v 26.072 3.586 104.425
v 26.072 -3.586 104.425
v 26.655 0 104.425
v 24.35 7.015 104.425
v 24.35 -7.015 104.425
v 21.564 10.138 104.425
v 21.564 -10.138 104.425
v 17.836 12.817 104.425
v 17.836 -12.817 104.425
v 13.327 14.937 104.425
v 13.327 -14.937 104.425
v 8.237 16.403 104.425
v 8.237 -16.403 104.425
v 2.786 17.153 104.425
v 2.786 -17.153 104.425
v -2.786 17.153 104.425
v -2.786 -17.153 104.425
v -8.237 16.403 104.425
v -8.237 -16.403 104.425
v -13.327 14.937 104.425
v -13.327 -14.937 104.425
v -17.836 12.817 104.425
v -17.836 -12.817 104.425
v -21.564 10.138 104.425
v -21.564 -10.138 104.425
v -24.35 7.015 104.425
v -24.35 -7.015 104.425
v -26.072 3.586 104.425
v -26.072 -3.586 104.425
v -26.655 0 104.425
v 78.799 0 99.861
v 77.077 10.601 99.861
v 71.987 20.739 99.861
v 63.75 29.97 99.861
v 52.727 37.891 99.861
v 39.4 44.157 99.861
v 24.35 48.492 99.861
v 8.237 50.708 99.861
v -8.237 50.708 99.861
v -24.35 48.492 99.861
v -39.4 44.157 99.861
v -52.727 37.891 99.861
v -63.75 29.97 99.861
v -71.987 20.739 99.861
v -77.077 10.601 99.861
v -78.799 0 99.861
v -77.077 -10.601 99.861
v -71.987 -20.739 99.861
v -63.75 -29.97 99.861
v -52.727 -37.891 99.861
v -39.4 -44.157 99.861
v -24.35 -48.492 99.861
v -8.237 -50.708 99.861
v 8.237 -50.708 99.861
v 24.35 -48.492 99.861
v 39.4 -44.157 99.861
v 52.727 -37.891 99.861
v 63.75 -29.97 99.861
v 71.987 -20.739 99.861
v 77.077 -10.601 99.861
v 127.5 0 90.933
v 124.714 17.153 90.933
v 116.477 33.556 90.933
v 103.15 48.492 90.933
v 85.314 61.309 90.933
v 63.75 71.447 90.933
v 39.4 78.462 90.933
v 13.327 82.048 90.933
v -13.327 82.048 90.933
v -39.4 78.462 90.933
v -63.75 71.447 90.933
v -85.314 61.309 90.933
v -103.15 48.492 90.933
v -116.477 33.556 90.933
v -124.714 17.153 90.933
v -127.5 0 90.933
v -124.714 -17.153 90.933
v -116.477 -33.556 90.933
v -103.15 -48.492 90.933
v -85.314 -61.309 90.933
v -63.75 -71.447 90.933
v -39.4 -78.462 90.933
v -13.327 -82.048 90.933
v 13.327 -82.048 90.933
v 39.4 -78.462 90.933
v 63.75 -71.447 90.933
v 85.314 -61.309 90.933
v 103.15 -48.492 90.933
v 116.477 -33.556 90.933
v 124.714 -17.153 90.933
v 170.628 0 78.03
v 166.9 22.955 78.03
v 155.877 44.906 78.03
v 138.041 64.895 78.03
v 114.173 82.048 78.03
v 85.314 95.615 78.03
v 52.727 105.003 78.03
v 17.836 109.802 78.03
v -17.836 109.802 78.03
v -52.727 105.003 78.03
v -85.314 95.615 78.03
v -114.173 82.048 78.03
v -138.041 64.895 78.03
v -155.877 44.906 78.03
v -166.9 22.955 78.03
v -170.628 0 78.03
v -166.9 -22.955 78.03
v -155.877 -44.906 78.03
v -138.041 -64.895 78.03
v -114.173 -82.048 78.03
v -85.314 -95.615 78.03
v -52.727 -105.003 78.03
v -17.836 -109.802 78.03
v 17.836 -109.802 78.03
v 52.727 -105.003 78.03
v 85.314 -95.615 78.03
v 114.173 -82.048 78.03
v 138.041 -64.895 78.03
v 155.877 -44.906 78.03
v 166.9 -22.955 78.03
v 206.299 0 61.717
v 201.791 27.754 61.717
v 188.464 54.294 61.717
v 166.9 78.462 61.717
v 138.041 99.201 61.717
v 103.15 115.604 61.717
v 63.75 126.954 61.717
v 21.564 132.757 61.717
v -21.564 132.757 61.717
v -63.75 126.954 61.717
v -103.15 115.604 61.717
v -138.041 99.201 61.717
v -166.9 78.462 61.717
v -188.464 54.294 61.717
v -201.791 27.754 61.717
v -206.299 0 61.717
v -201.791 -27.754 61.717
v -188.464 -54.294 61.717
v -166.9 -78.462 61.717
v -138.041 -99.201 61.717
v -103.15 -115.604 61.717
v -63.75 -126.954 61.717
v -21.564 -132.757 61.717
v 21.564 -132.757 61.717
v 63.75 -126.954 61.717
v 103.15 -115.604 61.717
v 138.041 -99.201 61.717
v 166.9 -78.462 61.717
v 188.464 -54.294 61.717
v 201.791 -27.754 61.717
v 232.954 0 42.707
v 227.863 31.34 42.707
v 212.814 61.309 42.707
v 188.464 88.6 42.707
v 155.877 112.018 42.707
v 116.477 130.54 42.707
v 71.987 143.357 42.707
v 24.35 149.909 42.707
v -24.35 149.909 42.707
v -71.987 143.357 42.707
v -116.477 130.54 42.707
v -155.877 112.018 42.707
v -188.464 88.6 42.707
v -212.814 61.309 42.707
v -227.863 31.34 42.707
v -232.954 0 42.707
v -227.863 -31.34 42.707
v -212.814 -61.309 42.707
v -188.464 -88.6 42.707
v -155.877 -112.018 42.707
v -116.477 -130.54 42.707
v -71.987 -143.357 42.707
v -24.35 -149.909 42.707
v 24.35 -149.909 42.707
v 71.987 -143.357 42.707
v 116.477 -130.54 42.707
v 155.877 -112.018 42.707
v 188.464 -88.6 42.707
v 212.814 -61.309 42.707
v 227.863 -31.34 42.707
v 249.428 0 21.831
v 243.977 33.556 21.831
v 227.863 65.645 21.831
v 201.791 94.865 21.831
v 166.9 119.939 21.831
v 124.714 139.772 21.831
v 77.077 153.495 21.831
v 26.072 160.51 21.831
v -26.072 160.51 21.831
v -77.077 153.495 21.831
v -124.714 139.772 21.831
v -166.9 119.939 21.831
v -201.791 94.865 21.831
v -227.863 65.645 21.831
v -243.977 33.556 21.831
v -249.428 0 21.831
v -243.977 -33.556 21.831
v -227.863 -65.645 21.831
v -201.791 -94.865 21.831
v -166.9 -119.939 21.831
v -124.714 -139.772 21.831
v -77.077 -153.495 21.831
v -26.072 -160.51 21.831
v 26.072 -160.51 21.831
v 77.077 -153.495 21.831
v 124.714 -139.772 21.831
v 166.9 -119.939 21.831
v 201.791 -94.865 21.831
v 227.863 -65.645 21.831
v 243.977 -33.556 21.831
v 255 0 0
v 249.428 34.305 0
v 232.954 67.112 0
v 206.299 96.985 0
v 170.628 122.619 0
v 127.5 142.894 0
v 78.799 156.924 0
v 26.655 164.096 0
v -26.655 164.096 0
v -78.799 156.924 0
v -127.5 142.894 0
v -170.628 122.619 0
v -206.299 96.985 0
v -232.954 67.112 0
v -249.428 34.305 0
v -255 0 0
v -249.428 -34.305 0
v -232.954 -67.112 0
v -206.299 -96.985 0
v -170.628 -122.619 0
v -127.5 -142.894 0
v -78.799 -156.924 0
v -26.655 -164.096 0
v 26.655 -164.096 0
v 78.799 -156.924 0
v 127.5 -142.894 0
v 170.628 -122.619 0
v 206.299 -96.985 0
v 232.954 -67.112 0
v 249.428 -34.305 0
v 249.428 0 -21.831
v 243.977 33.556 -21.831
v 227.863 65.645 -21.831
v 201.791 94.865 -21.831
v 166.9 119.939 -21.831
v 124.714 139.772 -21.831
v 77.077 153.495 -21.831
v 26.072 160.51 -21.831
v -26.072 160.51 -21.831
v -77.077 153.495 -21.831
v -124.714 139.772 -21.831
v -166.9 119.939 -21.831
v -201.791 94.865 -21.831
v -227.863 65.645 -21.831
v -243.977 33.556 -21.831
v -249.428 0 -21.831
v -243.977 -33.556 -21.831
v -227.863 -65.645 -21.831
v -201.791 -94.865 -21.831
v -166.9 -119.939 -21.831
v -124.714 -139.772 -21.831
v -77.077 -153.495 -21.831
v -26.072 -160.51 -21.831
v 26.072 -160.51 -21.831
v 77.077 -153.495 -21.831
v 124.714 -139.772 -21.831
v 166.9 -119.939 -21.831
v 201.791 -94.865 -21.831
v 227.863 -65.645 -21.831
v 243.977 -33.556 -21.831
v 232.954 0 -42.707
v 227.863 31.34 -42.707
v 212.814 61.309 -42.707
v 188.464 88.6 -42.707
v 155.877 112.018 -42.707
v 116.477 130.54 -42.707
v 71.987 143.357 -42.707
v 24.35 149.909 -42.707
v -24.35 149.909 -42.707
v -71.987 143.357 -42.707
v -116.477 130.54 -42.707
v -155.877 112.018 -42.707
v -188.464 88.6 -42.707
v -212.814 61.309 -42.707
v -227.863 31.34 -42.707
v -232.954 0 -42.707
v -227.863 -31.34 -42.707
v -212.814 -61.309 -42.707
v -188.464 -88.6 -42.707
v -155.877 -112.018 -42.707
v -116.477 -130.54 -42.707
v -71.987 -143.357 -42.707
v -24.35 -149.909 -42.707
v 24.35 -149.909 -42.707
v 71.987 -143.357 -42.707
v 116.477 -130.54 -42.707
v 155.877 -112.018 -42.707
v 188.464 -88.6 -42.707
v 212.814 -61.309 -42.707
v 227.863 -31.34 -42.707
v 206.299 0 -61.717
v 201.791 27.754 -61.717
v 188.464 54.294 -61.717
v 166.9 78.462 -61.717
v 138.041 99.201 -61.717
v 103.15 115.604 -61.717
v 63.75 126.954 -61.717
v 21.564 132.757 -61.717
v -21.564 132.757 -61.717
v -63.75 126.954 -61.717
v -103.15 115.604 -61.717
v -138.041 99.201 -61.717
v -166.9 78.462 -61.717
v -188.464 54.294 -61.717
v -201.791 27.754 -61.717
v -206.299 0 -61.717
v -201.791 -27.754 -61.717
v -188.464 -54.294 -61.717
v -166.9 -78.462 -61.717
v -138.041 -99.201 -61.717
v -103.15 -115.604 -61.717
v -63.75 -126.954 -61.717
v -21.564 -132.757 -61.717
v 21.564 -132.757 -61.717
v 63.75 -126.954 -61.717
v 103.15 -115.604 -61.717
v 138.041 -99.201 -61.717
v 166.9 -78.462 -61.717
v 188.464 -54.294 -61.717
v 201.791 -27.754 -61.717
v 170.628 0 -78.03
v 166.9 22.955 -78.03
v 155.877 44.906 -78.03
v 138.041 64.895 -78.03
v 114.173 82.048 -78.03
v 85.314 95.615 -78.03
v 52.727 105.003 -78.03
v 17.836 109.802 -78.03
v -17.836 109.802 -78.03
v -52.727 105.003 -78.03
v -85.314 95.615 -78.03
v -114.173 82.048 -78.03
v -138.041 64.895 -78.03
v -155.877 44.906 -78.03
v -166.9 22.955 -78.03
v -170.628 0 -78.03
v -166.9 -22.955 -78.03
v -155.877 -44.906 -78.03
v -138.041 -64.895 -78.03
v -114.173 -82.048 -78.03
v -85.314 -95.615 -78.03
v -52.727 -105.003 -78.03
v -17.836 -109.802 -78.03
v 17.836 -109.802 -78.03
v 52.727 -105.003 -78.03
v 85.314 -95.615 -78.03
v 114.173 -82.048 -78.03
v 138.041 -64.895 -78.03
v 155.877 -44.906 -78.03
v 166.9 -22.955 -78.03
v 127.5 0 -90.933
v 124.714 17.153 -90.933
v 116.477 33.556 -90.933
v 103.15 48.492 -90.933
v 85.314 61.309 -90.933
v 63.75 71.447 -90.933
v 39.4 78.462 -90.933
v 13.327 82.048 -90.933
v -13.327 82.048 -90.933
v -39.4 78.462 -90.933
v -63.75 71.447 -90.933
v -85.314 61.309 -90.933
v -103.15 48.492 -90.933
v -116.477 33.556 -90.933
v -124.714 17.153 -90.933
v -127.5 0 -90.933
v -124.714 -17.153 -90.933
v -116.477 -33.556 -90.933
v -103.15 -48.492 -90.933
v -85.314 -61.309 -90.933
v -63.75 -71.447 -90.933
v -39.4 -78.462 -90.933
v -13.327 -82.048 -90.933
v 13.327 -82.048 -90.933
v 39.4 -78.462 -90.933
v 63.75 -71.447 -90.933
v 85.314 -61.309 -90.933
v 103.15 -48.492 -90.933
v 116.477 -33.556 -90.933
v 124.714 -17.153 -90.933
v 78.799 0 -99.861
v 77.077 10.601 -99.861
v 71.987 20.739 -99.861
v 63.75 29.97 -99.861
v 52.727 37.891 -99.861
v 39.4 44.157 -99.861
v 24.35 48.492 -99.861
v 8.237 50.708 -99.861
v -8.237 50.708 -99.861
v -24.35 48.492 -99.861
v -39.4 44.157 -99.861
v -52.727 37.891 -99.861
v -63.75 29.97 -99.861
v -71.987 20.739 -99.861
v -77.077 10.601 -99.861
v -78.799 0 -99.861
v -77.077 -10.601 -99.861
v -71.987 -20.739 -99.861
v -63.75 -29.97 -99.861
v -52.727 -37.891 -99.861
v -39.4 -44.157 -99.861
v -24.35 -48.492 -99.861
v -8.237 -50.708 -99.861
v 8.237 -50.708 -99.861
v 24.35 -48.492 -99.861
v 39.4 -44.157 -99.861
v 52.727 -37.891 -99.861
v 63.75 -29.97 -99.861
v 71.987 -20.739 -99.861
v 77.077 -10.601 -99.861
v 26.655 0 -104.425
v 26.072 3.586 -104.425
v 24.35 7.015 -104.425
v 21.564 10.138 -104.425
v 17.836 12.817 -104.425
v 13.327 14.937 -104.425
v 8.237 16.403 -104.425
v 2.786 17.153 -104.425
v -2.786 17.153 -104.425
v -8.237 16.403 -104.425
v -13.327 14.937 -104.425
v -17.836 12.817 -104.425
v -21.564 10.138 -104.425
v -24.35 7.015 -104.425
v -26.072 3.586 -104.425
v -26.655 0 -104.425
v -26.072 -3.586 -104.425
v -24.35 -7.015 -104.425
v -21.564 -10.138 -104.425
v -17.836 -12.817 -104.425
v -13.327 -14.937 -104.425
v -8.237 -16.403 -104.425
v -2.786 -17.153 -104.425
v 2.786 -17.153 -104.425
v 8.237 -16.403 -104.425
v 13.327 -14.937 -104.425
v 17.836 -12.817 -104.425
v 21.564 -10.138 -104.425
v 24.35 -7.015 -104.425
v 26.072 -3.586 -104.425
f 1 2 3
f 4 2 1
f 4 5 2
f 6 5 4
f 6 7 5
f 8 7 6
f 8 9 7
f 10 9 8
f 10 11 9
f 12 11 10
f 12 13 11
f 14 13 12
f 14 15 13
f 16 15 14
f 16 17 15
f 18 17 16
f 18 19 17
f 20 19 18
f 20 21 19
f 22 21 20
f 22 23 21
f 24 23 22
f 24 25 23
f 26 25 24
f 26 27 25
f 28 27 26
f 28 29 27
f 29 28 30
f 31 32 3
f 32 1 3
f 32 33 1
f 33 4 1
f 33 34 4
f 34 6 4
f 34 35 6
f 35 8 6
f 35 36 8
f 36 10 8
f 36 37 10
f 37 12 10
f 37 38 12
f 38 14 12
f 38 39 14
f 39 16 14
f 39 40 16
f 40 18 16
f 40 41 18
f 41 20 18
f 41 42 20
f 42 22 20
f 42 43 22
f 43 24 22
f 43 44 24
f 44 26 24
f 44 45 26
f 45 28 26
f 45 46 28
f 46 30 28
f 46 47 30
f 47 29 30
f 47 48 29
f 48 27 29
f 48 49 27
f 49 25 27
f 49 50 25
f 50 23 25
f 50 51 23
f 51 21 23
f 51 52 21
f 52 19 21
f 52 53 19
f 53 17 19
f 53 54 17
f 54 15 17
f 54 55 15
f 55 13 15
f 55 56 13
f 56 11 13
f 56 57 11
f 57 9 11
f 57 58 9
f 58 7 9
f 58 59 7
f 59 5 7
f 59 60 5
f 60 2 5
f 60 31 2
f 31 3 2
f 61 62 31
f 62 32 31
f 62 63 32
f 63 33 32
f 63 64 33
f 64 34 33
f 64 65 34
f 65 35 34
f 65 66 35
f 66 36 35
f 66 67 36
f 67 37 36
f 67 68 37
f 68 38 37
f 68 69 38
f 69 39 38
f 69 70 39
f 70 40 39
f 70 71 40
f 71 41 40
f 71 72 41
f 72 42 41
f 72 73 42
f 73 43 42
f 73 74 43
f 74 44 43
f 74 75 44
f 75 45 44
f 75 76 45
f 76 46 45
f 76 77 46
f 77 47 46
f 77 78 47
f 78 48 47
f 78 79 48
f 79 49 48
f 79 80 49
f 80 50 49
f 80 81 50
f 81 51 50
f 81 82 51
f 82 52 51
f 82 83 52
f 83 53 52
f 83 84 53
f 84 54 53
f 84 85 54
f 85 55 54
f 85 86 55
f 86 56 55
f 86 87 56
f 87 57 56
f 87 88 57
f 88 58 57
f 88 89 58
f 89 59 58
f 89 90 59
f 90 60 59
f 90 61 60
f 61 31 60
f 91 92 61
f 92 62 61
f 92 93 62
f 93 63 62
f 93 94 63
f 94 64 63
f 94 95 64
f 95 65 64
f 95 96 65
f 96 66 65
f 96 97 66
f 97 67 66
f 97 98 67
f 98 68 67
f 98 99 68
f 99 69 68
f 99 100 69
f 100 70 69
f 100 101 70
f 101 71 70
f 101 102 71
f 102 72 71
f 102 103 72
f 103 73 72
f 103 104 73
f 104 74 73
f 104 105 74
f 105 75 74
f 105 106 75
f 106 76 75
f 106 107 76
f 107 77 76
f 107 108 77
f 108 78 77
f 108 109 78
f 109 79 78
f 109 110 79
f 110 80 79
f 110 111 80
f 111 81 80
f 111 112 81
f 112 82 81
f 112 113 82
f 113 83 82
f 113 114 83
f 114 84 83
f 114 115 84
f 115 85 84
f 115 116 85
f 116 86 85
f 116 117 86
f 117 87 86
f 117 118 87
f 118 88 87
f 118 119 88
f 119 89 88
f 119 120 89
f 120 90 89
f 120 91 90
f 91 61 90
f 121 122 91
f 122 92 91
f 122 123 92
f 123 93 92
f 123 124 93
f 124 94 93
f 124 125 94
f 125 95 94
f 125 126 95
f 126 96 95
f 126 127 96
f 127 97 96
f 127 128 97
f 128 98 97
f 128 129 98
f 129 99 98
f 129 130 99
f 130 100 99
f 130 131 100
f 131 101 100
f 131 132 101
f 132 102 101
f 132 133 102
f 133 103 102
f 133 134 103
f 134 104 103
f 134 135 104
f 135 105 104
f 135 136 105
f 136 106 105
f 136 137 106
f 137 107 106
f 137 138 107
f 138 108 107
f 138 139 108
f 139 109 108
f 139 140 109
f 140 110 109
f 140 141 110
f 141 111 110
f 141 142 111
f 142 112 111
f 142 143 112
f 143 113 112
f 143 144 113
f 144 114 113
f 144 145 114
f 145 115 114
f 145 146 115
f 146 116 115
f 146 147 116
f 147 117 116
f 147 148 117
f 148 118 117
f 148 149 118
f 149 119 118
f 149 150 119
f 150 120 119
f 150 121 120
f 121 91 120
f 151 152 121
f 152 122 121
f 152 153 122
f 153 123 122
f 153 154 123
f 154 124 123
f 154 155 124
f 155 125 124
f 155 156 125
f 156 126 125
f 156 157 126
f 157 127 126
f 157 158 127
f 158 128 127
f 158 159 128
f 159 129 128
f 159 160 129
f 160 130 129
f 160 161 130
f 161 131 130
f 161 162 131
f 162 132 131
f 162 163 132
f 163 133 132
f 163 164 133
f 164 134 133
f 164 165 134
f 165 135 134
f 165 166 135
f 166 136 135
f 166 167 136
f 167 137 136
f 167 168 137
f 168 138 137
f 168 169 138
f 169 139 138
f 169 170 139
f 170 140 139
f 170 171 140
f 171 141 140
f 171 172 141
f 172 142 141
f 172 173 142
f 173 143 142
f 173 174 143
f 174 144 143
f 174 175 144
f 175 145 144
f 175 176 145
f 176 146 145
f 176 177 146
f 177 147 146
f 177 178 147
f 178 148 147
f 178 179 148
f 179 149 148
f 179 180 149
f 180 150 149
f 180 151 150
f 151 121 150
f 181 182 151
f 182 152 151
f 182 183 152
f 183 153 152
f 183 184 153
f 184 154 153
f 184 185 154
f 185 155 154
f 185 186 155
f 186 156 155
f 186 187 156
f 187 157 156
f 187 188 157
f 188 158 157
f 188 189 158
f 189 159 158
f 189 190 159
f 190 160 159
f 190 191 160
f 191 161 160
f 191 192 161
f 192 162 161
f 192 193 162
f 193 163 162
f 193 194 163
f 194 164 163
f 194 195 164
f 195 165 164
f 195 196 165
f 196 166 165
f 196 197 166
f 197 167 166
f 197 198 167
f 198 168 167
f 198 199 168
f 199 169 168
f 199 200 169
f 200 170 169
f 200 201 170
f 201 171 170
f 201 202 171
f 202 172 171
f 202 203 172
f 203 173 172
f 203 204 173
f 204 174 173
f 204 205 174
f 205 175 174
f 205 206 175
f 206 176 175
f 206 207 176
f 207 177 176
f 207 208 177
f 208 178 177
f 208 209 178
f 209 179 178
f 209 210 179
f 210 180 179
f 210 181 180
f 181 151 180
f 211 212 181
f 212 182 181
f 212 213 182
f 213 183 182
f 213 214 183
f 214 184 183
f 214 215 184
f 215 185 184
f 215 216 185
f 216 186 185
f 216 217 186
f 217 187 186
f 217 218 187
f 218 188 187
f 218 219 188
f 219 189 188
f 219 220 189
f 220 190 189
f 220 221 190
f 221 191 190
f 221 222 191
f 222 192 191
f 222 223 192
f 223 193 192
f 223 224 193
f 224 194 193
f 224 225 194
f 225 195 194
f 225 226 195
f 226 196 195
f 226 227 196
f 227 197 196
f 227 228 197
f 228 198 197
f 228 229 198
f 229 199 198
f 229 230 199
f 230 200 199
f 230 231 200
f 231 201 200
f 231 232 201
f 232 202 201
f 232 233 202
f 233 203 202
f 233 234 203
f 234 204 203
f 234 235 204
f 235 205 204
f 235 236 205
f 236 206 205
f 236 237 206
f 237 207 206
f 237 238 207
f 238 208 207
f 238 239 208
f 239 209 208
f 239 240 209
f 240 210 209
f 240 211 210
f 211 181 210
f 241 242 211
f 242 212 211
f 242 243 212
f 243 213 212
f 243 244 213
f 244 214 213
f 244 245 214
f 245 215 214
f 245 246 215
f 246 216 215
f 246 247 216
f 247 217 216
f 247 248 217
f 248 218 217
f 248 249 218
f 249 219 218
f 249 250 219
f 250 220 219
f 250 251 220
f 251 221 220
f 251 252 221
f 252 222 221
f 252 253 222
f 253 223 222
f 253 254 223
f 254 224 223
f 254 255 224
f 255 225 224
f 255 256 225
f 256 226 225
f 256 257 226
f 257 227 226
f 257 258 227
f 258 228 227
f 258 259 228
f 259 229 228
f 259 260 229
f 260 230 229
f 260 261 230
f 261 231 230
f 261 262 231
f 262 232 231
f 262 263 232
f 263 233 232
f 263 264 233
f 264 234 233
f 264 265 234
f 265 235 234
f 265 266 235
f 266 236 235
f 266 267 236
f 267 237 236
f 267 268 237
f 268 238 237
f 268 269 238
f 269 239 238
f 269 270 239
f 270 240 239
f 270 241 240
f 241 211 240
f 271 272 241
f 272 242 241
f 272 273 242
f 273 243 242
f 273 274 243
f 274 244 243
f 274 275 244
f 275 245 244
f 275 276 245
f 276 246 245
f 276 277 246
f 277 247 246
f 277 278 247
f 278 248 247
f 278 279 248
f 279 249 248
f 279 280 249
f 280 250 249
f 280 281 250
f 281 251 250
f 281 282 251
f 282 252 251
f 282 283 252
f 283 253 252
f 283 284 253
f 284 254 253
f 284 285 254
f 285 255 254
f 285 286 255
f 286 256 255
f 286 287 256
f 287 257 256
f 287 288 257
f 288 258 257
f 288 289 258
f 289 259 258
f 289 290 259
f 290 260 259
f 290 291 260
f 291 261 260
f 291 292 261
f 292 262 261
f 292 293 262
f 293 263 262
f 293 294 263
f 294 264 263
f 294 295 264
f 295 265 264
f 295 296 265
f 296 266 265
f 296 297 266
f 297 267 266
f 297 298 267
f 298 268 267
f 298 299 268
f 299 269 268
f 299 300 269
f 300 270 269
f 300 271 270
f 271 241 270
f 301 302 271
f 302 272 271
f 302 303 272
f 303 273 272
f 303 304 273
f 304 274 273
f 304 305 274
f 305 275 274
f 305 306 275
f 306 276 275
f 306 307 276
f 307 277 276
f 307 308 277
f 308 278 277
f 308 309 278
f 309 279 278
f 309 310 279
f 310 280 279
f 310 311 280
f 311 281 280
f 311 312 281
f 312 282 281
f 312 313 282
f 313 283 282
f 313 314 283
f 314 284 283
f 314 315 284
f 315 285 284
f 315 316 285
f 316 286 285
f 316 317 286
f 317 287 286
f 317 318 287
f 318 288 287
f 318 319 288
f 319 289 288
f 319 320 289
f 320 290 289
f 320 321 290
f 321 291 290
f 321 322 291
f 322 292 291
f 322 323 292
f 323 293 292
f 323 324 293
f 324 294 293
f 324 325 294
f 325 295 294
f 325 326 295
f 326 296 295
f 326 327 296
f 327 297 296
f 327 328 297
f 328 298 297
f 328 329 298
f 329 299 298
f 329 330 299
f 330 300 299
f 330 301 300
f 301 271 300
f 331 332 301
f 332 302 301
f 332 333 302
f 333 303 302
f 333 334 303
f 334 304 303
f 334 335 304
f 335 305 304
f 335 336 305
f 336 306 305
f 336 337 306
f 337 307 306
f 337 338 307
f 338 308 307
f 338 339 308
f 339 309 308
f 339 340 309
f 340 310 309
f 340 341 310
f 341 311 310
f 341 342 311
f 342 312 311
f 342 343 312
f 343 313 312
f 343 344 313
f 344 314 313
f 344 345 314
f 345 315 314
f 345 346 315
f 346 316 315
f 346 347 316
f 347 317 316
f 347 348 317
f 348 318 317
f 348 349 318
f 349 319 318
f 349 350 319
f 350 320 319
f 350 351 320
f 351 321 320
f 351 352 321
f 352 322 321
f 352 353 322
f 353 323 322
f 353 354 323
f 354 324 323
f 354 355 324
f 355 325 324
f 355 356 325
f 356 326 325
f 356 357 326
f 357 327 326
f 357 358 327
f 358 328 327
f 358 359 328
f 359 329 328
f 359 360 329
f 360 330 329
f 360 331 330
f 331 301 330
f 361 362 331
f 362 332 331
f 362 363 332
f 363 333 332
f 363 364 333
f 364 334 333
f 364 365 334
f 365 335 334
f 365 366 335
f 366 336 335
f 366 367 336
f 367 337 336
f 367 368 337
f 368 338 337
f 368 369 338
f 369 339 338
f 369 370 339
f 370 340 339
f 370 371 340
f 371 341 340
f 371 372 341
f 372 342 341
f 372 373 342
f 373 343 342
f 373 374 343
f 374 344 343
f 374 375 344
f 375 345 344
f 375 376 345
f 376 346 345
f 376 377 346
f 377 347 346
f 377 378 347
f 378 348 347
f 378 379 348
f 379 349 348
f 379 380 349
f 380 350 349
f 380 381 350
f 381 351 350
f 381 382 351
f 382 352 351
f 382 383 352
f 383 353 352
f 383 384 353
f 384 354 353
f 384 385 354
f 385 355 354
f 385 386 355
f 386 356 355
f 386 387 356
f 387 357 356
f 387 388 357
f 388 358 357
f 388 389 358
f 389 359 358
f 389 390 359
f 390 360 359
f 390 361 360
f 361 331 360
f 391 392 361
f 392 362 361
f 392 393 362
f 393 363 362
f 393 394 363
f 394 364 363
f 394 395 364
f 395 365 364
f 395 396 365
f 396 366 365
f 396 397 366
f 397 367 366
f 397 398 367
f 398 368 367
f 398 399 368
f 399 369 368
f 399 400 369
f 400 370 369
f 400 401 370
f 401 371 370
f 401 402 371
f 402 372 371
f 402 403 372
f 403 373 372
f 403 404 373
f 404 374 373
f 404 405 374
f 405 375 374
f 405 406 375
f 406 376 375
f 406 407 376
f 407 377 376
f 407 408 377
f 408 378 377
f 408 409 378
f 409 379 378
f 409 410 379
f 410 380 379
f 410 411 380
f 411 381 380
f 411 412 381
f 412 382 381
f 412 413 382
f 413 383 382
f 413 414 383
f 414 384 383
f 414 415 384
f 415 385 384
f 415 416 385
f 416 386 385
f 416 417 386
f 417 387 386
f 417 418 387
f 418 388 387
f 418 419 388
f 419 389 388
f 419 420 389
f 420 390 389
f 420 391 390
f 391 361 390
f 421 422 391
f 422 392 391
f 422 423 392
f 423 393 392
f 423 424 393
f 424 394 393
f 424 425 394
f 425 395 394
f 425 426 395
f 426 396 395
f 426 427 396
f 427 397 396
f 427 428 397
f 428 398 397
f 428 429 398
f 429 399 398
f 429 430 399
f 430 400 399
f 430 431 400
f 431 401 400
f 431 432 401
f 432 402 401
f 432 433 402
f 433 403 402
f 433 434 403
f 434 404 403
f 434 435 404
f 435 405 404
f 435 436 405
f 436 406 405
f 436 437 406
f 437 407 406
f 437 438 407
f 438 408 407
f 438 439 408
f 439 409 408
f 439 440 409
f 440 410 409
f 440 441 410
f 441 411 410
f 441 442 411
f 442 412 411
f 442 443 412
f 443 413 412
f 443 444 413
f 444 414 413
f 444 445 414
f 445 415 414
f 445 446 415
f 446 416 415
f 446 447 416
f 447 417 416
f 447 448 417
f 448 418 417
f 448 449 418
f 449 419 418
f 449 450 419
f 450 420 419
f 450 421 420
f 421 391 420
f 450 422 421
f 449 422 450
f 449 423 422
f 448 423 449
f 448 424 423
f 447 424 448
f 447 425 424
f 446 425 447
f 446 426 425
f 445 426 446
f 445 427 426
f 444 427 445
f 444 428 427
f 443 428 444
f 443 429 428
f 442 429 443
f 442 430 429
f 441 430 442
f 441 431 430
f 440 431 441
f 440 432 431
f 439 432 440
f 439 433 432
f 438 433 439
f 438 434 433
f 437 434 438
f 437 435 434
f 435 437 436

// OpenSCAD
// Generated by SolidPython 1.0.1 on 2020-07-29 00:46:53


scale(v = [17, 11, 7]) {
	sphere(r = 15);
}
/***********************************************
*********      SolidPython code:      **********
************************************************
 
# import packages: SolidPython
from solid import *
from solid.utils import *
from itertools import chain, combinations, permutations


class Resize:

    def __init__(self, scad_file):
        self.scad_file = scad_file
        #self.scad_file = import_scad(scad_file)
        # cone/cylinder param:
        self.r1 = 0
        self.r2 = 0
        self.h = 0
        # rectangular prism param:
        self.w = 0
        self.l = 0
        # ellipse param:
        self.r = 0

    # import OpenScad code (file name corresponds to shape)


    # classify shape + parameters
    def assign(self, param1, param2, param3):
        if self.scad_file == 'cone.scad':
            self.r1 = param1
            self.r2 = param2
            self.h = param3
        elif self.scad_file == 'cylinder.scad':
            self.r1 = param1
            self.r2 = param2
            self.h = param3
        elif self.scad_file == 'rectangularPrism.scad':
            self.h = param1
            self.l = param2
            self.w = param3
        else:
            self.r = param1
            self.h = param2

    # resize parameters
    def iterate(self):
        x = range(3, 20, 2)
        i = 1
        if self.scad_file == 'cone.scad':
            tempList = list(permutations(x, 2))
            for temp in tempList:
                param1 = temp[0]
                param2 = temp[1]
                filepath = 'produced_scad_files/' + 'cone' + str(param1) + '_' + str(param2) + '_' + '.scad'
                scad_render_to_file(cylinder(h=param1, r1=param2, r2=0), filepath)

        elif self.scad_file == 'cylinder.scad':
            tempList = list(permutations(x, 3))
            for temp in tempList:
                param1 = temp[0]
                param2 = temp[1]
                filepath = 'produced_scad_files/' + 'cylinder' + str(param1) + '_' + str(param2) + '_' + '.scad'
                scad_render_to_file(cylinder(h=param1, r1=param2, r2=param2), filepath)

        elif self.scad_file == 'rectangularPrism.scad':
            tempList = list(permutations(x, 3))
            for temp in tempList:
                param1 = temp[0]
                param2 = temp[1]
                param3 = temp[2]
                filepath = 'produced_scad_files/' + 'rectangularPrism' + str(param1) + '_' + str(param2) + '_' + str(
                    param3) + '.scad'
                scad_render_to_file(cube(size=(param1, param2, param3)), filepath)

        elif self.scad_file == 'ellipse.scad':
            tempList = list(permutations(x, 4))
            for temp in tempList:
                param1 = temp[0]
                param2 = temp[1]
                param3 = temp[2]
                param4 = temp[3]
                filepath = 'produced_scad_files/' + 'ellipse' + str(param1) + '_' + str(param2) + '_' + str(param3) + '_' + str(param4) + '.scad'
                scad_render_to_file(scale([param1, param2, param3])(sphere(r=param4)), filepath)

    def render_to_scadfile(self):
        scad_render_to_file(scad, 'example.scad') 
 
************************************************/
